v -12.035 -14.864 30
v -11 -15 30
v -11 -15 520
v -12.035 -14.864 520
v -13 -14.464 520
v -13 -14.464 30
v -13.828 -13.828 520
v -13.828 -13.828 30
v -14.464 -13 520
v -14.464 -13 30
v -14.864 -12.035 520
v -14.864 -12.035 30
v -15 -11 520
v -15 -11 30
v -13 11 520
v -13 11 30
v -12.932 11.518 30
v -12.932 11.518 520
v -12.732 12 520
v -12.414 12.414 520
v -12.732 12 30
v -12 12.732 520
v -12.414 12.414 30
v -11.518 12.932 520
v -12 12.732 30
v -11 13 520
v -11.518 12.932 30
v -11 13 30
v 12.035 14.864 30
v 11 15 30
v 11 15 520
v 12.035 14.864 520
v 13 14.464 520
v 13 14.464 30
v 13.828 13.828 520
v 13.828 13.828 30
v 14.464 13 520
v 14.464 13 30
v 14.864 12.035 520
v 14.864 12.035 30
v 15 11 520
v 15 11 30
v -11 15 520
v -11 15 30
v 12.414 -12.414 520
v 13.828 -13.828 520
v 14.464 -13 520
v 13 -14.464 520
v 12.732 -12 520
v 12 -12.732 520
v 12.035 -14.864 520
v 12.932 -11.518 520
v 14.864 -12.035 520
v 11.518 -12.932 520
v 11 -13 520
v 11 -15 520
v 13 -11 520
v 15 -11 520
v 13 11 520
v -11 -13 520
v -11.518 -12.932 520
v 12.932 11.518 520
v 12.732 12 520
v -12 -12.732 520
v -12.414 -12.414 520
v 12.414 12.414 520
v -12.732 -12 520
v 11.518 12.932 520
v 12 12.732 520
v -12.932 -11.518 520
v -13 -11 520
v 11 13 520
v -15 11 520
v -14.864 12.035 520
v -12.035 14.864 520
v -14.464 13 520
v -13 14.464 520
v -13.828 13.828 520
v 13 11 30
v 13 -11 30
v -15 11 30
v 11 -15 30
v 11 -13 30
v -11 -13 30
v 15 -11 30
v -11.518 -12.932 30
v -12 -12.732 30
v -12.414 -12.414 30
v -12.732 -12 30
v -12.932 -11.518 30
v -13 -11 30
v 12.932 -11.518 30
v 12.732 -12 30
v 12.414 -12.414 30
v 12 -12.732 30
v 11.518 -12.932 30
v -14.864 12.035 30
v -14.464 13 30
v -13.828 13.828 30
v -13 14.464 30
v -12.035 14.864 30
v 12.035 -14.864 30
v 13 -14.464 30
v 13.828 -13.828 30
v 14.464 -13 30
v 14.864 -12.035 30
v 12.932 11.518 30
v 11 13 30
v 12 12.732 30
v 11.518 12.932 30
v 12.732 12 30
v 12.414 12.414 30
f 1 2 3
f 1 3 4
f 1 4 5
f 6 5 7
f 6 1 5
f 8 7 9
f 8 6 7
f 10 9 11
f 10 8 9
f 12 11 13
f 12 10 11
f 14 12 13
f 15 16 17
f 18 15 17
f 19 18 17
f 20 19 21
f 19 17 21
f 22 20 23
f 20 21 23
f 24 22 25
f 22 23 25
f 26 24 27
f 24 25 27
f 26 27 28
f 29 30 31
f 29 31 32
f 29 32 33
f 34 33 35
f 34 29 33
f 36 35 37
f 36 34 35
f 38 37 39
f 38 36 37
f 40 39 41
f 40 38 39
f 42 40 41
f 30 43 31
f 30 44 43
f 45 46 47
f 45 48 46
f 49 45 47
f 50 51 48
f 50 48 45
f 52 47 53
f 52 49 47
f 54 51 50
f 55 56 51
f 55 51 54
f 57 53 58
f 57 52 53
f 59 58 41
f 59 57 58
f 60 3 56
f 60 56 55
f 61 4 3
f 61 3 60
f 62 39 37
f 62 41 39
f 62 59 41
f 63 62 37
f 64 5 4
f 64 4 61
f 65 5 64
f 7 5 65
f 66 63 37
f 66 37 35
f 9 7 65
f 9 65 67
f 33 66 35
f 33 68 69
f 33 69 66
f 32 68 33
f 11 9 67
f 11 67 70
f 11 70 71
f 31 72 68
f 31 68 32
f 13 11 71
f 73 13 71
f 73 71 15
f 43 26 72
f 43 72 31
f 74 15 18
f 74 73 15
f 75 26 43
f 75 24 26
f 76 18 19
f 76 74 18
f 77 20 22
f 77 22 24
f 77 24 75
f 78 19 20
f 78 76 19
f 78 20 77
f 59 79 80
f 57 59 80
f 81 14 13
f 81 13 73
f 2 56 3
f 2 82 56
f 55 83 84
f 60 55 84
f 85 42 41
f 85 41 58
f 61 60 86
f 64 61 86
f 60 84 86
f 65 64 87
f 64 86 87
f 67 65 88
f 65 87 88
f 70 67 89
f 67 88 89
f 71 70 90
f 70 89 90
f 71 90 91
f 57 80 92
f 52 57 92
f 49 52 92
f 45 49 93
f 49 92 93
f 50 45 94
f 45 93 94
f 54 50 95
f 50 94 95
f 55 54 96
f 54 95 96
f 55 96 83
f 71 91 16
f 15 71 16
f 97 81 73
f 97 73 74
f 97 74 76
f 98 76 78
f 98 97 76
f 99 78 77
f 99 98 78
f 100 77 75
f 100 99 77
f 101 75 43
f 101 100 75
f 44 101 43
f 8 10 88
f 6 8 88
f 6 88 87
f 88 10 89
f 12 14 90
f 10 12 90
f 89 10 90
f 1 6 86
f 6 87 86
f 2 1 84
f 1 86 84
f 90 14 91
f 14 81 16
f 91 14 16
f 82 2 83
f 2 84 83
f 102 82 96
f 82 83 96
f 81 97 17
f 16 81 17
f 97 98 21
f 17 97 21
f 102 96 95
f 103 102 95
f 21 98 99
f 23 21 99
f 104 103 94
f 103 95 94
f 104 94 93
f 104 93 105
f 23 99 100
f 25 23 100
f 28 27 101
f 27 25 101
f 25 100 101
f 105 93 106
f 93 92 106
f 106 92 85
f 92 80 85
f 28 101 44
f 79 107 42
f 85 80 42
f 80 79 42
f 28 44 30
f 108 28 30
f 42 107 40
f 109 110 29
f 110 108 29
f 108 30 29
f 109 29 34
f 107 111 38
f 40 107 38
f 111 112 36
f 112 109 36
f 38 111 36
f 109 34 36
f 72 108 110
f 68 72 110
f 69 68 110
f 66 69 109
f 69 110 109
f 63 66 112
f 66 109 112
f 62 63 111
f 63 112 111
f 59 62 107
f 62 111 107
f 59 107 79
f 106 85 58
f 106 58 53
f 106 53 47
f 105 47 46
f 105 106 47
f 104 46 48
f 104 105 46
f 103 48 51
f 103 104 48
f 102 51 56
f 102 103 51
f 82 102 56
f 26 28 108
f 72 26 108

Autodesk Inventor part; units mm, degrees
ref_plane "Plano inicial" through (0, 0, 30) normal (0, 0, 1) x (1, 0, 0)
ref_plane "Plano final" through (0, 0, 520.0001) normal (0, 0, 1) x (1, 0, 0)
sketch "Esboço" plane through (0, 0, 0) normal (0, 0, 1) x (1, 0, 0)
  line L0 (-15, -11) -> (-15, 11)
  line L1 (-11, 15) -> (11, 15)
  line L2 (15, 11) -> (15, -11)
  line L3 (11, -15) -> (-11, -15)
  arc A0 (-15, -11) -> (-11, -15) centre (-11, -11) ccw
  arc A1 (15, 11) -> (11, 15) centre (11, 11) ccw
  arc A2 (-11, 15) -> (-15, 11) centre (-11, 11) ccw
  arc A3 (11, -15) -> (15, -11) centre (11, -11) ccw
  arc A4 (-11, 13) -> (-13, 11) centre (-11, 11) ccw
  line L4 (-11, 13) -> (11, 13)
  arc A5 (13, 11) -> (11, 13) centre (11, 11) ccw
  line L5 (13, 11) -> (13, -11)
  arc A6 (11, -13) -> (13, -11) centre (11, -11) ccw
  line L6 (11, -13) -> (-11, -13)
  arc A7 (-13, -11) -> (-11, -13) centre (-11, -11) ccw
  line L7 (-13, -11) -> (-13, 11)
  line L8 (0, 22.1598) -> (0, -22.1598) construction
  line L9 (-22.1598, 0) -> (22.1598, 0) construction
  dimension "d7" = 4
  dimension "d9" = 30
  dimension "d11" = 30
  dimension "d12" = 2
  dimension "d15" = 15
  dimension "d16" = 15
extrude "Corpo" add sketch "Esboço" along normal up to surface (490.0001 mm away) from surface at 30
sketch "Sketch3" plane through (0, 0, 0) normal (0, 0, 1) x (1, 0, 0)
  line L0 (0, 0) -> (10, 0)
ref_plane "Work Plane3" through (0, 0, 0) normal (0, -1, 0) x (1, 0, 0)
sketch "Sketch4" plane through (0, 0, 0) normal (0, -1, 0) x (1, 0, 0)
  line L0 (-2, 30) -> (12, 30)
  line L1 (-2, 520.0001) -> (12, 520.0001)
  dimension "d18" = 490.0001
ref_plane "Plano de trabalho4" through (11, 160, 520) normal (0, 0, 1) x (1, 0, 0)
split "Dividir1" plane through (11, 160, 520) removes the side toward (0, 0, 1)
ref_plane "Plano de trabalho5" through (11, -290, 30) normal (0, 0, -1) x (-1, 0, 0)
split "Dividir2" plane through (11, -290, 30) removes the side toward (0, 0, -1)
equation "\"d7\" = G_IR"
equation "\"d9\" = G_W"
equation "\"d11\" = G_H"
equation "\"d12\" = G_T"
equation "\"d15\" = 0.5 * d9"
equation "\"d16\" = 0.5 * d11"
equation "\"d3\" = G_L"
equation "\"G_W\" = 30"
equation "\"G_H\" = 30"
equation "\"G_T\" = 2"
equation "\"G_IR\" = 4"
equation "\"G_L\" = d18"
equation "\"G_OFFSET_END\" = -29.99991"
equation "\"d14\" = G_OFFSET_END + B_L"
equation "\"B_L\" = 550"
properties part number "ISO 10799-2 - 30x30x2 - 490" material "Aço, suave"
